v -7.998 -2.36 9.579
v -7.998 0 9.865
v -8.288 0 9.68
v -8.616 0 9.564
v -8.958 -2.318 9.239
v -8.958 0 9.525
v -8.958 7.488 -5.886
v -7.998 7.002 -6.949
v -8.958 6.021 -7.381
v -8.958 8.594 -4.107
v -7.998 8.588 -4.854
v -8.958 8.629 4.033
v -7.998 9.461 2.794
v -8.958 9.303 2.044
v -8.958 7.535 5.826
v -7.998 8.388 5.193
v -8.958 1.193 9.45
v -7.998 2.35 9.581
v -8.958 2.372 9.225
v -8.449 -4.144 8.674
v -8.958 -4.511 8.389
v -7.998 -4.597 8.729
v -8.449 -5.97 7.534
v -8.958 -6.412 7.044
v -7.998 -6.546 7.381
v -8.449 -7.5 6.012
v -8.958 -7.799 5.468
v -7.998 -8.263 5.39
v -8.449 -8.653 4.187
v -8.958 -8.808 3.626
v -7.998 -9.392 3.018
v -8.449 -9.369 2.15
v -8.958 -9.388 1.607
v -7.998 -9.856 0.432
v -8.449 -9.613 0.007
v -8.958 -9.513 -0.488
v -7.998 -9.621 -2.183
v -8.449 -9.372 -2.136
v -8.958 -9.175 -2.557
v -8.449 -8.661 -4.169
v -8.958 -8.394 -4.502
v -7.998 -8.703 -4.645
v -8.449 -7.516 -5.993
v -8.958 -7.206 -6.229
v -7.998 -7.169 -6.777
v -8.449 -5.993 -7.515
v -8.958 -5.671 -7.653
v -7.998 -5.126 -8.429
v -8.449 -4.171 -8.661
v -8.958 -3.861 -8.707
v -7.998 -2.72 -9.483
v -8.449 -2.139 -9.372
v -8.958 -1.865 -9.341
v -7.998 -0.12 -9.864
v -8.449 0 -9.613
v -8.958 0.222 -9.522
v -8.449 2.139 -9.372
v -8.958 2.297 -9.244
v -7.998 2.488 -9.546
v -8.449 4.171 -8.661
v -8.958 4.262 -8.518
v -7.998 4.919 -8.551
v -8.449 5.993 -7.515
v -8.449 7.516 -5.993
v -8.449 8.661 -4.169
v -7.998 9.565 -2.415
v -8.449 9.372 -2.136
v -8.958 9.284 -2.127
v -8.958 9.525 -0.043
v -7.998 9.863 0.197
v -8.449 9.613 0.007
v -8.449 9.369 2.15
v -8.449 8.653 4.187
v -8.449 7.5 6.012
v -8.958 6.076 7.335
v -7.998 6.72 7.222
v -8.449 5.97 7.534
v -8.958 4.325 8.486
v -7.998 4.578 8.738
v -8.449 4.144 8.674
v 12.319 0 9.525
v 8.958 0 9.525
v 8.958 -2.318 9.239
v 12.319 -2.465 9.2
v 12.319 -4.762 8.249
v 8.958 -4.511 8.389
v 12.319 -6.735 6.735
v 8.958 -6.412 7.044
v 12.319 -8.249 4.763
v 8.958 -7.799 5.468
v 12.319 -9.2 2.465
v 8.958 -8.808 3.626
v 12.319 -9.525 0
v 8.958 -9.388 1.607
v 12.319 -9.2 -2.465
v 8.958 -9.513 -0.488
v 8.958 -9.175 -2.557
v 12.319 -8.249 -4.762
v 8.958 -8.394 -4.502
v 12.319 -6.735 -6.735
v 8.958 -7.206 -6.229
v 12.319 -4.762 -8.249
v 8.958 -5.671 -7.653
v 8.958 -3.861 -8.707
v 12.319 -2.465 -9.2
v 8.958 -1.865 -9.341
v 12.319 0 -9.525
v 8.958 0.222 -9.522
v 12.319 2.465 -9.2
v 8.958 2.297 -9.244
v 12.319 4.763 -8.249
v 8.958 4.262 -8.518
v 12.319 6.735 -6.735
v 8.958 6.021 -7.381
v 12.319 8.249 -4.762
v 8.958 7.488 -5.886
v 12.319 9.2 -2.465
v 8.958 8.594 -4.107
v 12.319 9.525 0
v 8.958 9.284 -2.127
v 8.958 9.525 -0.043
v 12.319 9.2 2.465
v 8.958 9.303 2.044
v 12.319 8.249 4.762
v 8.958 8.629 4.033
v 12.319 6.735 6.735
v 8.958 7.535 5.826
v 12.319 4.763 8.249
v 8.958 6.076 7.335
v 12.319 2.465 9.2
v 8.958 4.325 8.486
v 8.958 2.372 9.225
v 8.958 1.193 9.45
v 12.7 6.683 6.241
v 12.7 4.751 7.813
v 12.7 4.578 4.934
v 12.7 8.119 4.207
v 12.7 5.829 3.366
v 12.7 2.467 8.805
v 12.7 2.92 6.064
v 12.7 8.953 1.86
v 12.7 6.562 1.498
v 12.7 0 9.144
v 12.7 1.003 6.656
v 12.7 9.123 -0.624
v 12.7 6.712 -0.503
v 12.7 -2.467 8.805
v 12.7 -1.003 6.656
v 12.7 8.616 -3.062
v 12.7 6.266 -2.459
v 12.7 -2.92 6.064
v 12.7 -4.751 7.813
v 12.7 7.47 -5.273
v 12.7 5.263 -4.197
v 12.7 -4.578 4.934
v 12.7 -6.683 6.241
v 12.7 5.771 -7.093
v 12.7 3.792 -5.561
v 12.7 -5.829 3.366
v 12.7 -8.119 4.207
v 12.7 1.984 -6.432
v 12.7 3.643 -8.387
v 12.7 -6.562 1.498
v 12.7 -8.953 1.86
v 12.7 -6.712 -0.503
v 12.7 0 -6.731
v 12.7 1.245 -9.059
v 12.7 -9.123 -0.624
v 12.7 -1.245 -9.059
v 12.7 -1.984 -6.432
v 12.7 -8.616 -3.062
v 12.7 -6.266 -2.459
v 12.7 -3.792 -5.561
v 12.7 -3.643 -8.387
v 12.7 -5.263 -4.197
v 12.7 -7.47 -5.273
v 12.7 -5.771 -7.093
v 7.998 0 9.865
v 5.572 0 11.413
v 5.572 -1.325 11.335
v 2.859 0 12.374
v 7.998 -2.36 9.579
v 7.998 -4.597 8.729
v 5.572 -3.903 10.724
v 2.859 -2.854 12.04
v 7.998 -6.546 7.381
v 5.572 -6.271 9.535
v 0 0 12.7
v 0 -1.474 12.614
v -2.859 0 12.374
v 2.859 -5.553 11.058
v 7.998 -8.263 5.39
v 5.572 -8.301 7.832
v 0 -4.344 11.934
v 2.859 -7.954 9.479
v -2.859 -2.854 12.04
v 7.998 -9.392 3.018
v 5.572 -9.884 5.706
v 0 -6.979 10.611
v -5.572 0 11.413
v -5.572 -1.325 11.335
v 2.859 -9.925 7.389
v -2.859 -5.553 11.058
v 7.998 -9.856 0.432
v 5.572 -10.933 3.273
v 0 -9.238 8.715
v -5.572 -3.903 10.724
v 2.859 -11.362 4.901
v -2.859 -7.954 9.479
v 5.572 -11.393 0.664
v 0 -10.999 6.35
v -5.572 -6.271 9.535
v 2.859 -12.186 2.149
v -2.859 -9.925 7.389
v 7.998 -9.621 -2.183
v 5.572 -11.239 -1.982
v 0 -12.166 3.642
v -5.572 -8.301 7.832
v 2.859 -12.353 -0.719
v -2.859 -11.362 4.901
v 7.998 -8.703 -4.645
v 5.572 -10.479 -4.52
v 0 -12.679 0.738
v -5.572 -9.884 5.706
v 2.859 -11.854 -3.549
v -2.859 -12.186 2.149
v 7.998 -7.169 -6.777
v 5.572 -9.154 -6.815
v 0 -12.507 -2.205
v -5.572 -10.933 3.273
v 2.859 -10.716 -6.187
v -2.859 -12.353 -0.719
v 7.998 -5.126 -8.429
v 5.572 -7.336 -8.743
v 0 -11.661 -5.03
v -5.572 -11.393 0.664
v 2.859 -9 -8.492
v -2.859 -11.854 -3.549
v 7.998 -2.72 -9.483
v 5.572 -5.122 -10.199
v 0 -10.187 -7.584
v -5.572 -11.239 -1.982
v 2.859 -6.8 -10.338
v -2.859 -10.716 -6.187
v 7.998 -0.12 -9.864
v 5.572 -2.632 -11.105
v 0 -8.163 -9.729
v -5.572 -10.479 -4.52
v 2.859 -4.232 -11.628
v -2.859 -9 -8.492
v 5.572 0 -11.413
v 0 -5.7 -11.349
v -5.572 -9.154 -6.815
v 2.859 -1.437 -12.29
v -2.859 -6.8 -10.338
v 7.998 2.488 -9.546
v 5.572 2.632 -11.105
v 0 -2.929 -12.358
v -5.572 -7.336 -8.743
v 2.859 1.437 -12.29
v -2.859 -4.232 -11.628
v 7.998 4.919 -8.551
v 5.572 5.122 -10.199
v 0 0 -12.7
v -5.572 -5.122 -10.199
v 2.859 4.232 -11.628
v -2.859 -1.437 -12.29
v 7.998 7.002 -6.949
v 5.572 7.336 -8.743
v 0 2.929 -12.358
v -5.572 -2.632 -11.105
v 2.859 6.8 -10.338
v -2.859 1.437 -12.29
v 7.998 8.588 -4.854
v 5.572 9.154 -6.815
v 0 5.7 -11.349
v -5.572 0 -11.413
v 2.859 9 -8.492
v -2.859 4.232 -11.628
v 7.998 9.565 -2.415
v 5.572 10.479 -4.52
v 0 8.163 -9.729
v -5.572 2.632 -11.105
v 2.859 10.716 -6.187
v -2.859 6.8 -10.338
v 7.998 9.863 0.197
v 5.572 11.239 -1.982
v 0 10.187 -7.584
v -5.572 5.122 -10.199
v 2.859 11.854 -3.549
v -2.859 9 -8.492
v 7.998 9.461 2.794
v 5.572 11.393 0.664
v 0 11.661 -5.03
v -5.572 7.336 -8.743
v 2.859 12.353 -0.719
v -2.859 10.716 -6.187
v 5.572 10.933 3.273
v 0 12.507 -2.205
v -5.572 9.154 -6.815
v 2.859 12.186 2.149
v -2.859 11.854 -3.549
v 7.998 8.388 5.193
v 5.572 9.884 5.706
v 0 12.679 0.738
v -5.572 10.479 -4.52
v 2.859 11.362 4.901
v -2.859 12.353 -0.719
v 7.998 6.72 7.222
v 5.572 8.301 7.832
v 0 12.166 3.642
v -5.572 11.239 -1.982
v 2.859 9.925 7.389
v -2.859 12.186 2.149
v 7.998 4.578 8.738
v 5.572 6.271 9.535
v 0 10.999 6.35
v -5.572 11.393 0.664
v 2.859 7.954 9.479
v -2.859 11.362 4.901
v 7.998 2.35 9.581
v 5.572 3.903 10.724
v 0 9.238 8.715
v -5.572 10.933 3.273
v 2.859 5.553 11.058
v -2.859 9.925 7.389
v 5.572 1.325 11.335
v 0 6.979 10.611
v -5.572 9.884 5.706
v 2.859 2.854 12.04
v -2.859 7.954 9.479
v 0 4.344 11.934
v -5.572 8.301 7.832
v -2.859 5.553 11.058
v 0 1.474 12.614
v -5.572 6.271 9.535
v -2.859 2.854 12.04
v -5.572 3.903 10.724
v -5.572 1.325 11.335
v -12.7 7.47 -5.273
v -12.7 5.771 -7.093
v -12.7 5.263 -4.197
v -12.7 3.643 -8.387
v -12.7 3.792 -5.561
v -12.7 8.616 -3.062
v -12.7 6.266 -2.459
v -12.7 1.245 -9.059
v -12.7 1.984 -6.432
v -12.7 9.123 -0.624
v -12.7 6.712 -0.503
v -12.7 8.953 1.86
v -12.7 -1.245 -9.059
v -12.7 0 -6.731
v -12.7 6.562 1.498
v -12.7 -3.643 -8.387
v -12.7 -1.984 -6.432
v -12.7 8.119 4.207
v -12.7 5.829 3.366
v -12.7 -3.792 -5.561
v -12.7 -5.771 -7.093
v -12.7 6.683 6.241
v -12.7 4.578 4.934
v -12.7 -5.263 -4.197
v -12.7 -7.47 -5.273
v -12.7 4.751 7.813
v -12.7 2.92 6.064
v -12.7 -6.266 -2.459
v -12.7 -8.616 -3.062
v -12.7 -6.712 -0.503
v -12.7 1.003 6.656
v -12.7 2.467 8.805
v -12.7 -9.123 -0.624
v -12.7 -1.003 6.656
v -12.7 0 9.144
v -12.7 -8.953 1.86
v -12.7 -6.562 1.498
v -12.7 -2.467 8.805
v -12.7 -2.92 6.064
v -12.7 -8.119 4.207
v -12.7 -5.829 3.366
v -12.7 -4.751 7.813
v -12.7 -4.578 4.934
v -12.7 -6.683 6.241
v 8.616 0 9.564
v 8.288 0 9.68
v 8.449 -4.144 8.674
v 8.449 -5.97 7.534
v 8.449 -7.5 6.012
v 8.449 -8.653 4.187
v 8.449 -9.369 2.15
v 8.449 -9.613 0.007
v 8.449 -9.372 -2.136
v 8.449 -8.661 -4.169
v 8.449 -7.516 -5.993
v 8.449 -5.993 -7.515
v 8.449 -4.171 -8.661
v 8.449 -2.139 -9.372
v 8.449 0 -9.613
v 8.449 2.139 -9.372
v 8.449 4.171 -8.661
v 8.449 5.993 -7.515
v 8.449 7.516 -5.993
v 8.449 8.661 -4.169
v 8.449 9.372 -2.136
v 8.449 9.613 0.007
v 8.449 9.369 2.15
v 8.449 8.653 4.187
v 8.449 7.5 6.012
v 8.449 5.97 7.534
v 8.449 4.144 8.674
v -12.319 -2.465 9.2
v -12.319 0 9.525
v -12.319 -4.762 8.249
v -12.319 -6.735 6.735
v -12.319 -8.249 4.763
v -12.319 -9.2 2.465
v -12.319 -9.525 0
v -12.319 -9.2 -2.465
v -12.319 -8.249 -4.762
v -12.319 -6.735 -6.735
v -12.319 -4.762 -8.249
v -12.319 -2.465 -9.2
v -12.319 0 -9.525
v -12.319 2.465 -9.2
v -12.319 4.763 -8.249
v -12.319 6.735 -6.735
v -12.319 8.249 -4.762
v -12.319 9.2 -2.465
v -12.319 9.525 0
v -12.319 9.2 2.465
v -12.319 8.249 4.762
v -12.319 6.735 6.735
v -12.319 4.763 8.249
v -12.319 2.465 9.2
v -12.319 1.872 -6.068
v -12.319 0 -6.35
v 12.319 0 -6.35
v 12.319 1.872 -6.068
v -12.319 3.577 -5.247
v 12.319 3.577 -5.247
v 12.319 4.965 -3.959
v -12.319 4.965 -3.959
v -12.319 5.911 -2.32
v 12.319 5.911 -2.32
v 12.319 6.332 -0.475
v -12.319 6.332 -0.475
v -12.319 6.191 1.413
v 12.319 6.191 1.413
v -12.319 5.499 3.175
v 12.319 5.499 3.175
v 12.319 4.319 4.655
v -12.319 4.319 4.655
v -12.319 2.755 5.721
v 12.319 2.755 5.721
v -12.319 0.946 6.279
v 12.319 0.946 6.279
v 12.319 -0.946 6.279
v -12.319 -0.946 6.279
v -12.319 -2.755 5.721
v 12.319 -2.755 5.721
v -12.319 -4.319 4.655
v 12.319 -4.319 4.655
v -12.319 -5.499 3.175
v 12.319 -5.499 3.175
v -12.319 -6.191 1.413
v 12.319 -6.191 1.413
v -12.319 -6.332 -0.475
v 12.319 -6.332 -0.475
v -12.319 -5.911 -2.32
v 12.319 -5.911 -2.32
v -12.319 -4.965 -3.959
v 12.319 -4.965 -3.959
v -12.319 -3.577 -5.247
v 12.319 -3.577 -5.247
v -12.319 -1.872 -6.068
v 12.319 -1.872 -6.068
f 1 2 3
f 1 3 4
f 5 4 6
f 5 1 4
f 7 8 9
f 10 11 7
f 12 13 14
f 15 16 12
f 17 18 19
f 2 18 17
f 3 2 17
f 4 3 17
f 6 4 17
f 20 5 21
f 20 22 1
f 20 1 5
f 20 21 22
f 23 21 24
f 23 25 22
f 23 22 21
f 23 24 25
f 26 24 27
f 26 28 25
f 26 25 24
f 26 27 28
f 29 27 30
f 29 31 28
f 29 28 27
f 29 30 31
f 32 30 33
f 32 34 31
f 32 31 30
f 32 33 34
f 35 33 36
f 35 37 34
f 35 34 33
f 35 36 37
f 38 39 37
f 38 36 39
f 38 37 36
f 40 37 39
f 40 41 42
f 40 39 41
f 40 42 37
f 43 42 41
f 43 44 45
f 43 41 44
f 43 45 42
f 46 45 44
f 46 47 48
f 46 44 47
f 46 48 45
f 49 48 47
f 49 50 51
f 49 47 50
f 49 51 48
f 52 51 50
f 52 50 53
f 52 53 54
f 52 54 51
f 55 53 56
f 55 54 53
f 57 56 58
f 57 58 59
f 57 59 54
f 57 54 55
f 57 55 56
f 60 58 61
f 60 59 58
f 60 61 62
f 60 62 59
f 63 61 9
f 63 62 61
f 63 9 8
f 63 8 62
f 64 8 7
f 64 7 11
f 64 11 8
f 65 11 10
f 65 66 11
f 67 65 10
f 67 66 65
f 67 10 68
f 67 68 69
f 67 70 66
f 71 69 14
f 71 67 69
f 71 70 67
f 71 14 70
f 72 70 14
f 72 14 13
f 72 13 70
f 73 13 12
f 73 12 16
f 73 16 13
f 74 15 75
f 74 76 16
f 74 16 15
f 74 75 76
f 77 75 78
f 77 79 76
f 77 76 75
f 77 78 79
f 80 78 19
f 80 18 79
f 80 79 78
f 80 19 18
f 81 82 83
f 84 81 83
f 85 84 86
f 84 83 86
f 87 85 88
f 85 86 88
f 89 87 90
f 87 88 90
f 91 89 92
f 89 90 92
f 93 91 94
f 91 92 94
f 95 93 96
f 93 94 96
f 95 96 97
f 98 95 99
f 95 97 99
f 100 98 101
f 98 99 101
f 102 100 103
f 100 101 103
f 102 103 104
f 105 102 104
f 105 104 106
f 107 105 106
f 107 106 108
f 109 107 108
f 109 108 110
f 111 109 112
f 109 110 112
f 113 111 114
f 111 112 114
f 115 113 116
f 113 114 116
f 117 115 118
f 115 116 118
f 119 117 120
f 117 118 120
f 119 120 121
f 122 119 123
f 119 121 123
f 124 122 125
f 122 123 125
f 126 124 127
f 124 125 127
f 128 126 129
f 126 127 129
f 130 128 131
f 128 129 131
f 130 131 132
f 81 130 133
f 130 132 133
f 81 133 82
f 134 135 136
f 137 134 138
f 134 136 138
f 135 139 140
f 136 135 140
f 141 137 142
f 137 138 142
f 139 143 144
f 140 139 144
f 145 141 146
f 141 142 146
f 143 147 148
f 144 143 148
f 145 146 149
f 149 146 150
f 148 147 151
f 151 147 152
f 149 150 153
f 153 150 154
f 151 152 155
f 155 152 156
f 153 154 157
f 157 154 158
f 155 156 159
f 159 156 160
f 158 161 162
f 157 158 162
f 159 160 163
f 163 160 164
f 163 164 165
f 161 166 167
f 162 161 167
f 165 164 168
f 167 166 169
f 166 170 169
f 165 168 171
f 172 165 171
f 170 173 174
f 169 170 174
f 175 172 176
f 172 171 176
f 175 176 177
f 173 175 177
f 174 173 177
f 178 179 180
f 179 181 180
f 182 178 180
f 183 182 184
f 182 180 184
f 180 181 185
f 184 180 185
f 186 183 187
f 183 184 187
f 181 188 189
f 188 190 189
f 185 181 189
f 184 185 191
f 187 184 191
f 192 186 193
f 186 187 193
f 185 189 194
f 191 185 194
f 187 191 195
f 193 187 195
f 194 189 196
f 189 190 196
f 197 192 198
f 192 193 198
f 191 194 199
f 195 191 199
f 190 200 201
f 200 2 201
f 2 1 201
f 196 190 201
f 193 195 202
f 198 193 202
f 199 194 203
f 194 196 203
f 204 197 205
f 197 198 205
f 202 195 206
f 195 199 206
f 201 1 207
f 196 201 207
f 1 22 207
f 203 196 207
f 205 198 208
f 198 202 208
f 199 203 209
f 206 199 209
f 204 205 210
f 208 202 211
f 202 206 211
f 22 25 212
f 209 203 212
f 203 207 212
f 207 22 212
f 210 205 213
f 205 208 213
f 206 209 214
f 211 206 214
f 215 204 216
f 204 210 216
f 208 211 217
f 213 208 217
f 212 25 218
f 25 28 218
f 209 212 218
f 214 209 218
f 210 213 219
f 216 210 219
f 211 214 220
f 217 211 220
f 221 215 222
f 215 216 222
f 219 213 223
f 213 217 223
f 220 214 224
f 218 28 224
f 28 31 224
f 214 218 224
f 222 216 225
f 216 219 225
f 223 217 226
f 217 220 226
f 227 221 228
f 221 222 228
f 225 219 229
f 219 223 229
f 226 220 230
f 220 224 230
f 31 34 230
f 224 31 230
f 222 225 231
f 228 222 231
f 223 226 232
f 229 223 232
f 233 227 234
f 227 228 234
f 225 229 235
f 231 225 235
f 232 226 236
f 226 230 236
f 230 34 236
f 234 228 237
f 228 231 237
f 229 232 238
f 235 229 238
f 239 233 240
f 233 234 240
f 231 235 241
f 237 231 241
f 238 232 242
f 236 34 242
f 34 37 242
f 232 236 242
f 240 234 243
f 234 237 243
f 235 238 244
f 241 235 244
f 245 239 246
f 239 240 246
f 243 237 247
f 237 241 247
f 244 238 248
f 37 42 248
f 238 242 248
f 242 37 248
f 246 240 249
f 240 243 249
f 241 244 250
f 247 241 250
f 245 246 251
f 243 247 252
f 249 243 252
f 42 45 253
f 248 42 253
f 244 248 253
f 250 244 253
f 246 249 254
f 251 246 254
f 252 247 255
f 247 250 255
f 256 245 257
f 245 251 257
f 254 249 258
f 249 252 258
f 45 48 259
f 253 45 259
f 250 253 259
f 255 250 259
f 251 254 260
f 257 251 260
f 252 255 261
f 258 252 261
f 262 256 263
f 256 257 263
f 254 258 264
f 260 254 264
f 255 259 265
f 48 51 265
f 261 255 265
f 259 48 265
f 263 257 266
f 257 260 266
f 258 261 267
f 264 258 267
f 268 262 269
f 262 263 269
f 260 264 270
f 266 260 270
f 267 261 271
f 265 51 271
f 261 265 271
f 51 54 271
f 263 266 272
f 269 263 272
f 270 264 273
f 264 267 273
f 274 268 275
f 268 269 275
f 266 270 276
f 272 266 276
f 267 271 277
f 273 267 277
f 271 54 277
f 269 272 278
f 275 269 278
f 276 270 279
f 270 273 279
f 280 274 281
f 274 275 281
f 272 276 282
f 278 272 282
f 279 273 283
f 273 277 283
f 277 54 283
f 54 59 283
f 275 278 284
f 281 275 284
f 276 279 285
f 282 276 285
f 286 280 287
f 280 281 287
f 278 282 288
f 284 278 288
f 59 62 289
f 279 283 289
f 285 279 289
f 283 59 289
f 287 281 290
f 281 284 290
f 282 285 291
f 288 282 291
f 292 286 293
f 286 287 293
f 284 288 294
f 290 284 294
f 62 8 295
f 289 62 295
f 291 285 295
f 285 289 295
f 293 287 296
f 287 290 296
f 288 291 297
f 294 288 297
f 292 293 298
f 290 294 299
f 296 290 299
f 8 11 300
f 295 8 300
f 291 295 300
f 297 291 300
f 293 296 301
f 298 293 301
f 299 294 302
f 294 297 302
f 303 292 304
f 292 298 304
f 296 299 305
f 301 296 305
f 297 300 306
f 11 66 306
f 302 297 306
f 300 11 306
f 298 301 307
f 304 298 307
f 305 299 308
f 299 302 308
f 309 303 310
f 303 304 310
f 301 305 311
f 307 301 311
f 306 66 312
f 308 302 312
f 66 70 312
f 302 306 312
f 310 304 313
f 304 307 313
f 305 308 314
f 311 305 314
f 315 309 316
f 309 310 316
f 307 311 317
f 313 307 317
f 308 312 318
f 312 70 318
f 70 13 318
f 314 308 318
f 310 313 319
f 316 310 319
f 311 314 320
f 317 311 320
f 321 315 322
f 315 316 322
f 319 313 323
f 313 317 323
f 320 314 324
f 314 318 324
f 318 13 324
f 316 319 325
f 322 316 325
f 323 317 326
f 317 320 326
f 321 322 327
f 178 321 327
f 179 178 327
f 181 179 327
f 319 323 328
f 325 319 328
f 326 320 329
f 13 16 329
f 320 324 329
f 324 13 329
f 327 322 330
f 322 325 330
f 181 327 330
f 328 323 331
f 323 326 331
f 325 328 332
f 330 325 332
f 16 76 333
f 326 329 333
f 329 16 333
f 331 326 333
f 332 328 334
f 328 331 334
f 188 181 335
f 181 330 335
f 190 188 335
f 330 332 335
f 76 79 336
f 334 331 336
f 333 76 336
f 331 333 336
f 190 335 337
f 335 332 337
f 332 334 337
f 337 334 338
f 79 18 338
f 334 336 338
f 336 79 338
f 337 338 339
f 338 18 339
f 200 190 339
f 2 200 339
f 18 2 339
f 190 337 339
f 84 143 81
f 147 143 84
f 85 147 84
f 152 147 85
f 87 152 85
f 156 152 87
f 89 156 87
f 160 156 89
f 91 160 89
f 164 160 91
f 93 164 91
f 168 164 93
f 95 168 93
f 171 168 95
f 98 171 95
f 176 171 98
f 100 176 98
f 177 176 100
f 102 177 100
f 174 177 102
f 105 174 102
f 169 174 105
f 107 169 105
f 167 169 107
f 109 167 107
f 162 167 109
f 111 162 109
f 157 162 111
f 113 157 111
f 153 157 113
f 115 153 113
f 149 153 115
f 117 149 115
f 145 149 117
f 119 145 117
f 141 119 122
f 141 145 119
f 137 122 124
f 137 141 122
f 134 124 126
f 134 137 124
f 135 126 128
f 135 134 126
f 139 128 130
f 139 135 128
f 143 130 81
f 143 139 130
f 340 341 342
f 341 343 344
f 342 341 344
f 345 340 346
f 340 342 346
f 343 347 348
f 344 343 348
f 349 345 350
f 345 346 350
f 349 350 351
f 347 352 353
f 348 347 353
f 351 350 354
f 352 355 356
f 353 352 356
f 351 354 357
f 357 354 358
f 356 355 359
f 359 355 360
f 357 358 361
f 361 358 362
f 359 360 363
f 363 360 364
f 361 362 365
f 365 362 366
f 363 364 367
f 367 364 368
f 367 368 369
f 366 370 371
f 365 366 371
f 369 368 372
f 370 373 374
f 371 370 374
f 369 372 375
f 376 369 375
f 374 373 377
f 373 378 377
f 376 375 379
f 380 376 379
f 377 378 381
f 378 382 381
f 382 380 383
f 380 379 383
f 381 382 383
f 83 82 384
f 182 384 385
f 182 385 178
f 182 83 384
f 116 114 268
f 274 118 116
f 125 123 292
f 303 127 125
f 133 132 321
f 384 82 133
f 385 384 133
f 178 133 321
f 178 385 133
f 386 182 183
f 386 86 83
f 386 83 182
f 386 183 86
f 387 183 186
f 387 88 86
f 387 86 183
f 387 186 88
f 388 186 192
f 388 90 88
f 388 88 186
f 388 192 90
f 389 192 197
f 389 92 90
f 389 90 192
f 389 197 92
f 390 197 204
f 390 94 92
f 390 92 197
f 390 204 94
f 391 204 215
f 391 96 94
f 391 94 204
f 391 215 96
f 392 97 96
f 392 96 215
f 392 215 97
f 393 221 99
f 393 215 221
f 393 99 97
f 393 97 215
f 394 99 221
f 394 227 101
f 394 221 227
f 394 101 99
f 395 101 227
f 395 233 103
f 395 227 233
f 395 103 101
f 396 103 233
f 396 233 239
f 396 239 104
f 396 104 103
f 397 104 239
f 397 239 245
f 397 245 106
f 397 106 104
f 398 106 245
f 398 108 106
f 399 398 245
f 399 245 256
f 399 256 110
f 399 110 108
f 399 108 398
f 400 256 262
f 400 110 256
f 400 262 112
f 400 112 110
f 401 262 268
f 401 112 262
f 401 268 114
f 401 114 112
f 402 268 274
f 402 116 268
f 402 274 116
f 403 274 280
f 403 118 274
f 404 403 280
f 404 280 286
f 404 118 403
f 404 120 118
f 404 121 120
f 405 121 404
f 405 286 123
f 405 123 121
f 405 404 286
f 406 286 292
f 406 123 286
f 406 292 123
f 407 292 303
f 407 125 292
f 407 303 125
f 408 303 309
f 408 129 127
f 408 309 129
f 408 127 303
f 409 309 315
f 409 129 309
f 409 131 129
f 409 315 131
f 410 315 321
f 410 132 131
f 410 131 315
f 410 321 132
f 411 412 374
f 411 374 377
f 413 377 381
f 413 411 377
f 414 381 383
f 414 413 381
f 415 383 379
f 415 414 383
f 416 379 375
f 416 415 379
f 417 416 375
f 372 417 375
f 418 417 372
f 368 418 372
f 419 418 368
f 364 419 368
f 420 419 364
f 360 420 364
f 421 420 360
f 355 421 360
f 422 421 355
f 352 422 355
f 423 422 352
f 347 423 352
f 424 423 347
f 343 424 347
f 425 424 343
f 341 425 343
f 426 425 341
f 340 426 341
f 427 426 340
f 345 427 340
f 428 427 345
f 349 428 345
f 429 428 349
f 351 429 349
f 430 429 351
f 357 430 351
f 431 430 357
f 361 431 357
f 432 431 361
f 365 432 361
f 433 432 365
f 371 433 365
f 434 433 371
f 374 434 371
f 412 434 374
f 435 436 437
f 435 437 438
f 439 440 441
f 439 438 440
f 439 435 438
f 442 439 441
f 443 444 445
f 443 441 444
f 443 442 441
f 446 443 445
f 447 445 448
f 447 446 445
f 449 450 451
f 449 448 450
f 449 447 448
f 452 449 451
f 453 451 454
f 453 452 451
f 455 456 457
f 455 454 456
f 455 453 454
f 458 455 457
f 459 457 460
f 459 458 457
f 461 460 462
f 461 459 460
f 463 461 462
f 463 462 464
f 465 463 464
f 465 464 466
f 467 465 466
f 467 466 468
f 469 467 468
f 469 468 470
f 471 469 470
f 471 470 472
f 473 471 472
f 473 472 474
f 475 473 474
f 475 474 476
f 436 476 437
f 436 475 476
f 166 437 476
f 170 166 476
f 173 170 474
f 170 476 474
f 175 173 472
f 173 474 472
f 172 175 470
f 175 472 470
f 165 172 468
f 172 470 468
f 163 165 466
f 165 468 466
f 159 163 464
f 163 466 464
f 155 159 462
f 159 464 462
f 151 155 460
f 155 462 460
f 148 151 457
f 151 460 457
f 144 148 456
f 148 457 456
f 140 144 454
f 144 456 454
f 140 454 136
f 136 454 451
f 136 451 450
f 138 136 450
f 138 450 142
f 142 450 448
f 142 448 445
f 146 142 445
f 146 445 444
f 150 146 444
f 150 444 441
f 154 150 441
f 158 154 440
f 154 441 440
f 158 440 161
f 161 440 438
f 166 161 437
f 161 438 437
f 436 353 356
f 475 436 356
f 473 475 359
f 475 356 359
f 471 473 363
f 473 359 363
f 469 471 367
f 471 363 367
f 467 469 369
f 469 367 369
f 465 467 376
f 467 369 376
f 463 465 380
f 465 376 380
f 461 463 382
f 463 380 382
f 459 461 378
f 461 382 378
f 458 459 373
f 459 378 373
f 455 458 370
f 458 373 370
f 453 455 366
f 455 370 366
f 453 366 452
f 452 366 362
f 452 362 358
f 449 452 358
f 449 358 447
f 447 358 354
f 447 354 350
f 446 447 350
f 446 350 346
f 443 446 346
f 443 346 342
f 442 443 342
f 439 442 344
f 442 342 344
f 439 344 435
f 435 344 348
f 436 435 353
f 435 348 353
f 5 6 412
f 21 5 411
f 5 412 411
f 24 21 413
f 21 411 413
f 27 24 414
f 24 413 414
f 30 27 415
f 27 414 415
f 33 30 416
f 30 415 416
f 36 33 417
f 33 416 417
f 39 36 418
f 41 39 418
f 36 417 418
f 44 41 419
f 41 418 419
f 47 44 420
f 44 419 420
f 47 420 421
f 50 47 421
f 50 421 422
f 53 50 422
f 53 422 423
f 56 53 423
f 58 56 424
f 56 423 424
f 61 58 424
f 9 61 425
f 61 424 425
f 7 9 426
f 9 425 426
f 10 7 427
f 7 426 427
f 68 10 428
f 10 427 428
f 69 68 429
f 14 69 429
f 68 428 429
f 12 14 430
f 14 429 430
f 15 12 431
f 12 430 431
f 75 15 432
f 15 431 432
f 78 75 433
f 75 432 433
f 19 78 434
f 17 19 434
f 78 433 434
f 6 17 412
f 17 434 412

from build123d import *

# Parameters (mm, degrees)
CUT_EXTRUDE1_DEPTH      = 22.997045256
CUT_EXTRUDE1_DEPTH_BACK = 22.997045256
SKETCH2_R               = 6.35
FILLET1_R               = 1.524
CHAMFER1_SIZE           = 0.381


with BuildPart() as part:
    # Sketch1 → Revolve1 (revolve)
    with BuildSketch(Plane.XY):
        with BuildLine():
            Line((-12.7, 0), (12.7, 0))
            Line((12.7, 0), (12.7, 9.525))
            Line((12.7, 9.525), (8.400260413, 9.525))
            ThreePointArc((8.400260413, 9.525), (0, 12.7), (-8.400260413, 9.525))
            Line((-8.400260413, 9.525), (-12.7, 9.525))
            Line((-12.7, 9.525), (-12.7, 0))
        make_face()
    revolve(axis=Axis((-19.734173111, 0, 0), (1, 0, 0)))

    # Sketch2 → Cut-Extrude1 (cut, two sides: drawn at the far end of the back side and taken through both)
    with BuildSketch(Plane(origin=(0, 0, 0), x_dir=(0, 0, -1), z_dir=(1, 0, 0)).offset(-CUT_EXTRUDE1_DEPTH_BACK)):
        Circle(SKETCH2_R)
    extrude(amount=CUT_EXTRUDE1_DEPTH + CUT_EXTRUDE1_DEPTH_BACK, mode=Mode.SUBTRACT)

    # Fillet1
    fillet1_edges = [part.edges().sort_by_distance(p)[0] for p in [
        (8.400260413, -9.525, 0),
        (-8.400260413, -9.525, 0),
    ]]
    fillet(fillet1_edges, radius=FILLET1_R)

    # Chamfer1
    chamfer1_edges = [part.edges().sort_by_distance(p)[0] for p in [
        (12.7, -9.525, 0),
        (-12.7, -9.525, 0),
        (12.7, 0, 6.35),
        (-12.7, 0, 6.35),
    ]]
    chamfer(chamfer1_edges, length=CHAMFER1_SIZE)


solid = part.part
